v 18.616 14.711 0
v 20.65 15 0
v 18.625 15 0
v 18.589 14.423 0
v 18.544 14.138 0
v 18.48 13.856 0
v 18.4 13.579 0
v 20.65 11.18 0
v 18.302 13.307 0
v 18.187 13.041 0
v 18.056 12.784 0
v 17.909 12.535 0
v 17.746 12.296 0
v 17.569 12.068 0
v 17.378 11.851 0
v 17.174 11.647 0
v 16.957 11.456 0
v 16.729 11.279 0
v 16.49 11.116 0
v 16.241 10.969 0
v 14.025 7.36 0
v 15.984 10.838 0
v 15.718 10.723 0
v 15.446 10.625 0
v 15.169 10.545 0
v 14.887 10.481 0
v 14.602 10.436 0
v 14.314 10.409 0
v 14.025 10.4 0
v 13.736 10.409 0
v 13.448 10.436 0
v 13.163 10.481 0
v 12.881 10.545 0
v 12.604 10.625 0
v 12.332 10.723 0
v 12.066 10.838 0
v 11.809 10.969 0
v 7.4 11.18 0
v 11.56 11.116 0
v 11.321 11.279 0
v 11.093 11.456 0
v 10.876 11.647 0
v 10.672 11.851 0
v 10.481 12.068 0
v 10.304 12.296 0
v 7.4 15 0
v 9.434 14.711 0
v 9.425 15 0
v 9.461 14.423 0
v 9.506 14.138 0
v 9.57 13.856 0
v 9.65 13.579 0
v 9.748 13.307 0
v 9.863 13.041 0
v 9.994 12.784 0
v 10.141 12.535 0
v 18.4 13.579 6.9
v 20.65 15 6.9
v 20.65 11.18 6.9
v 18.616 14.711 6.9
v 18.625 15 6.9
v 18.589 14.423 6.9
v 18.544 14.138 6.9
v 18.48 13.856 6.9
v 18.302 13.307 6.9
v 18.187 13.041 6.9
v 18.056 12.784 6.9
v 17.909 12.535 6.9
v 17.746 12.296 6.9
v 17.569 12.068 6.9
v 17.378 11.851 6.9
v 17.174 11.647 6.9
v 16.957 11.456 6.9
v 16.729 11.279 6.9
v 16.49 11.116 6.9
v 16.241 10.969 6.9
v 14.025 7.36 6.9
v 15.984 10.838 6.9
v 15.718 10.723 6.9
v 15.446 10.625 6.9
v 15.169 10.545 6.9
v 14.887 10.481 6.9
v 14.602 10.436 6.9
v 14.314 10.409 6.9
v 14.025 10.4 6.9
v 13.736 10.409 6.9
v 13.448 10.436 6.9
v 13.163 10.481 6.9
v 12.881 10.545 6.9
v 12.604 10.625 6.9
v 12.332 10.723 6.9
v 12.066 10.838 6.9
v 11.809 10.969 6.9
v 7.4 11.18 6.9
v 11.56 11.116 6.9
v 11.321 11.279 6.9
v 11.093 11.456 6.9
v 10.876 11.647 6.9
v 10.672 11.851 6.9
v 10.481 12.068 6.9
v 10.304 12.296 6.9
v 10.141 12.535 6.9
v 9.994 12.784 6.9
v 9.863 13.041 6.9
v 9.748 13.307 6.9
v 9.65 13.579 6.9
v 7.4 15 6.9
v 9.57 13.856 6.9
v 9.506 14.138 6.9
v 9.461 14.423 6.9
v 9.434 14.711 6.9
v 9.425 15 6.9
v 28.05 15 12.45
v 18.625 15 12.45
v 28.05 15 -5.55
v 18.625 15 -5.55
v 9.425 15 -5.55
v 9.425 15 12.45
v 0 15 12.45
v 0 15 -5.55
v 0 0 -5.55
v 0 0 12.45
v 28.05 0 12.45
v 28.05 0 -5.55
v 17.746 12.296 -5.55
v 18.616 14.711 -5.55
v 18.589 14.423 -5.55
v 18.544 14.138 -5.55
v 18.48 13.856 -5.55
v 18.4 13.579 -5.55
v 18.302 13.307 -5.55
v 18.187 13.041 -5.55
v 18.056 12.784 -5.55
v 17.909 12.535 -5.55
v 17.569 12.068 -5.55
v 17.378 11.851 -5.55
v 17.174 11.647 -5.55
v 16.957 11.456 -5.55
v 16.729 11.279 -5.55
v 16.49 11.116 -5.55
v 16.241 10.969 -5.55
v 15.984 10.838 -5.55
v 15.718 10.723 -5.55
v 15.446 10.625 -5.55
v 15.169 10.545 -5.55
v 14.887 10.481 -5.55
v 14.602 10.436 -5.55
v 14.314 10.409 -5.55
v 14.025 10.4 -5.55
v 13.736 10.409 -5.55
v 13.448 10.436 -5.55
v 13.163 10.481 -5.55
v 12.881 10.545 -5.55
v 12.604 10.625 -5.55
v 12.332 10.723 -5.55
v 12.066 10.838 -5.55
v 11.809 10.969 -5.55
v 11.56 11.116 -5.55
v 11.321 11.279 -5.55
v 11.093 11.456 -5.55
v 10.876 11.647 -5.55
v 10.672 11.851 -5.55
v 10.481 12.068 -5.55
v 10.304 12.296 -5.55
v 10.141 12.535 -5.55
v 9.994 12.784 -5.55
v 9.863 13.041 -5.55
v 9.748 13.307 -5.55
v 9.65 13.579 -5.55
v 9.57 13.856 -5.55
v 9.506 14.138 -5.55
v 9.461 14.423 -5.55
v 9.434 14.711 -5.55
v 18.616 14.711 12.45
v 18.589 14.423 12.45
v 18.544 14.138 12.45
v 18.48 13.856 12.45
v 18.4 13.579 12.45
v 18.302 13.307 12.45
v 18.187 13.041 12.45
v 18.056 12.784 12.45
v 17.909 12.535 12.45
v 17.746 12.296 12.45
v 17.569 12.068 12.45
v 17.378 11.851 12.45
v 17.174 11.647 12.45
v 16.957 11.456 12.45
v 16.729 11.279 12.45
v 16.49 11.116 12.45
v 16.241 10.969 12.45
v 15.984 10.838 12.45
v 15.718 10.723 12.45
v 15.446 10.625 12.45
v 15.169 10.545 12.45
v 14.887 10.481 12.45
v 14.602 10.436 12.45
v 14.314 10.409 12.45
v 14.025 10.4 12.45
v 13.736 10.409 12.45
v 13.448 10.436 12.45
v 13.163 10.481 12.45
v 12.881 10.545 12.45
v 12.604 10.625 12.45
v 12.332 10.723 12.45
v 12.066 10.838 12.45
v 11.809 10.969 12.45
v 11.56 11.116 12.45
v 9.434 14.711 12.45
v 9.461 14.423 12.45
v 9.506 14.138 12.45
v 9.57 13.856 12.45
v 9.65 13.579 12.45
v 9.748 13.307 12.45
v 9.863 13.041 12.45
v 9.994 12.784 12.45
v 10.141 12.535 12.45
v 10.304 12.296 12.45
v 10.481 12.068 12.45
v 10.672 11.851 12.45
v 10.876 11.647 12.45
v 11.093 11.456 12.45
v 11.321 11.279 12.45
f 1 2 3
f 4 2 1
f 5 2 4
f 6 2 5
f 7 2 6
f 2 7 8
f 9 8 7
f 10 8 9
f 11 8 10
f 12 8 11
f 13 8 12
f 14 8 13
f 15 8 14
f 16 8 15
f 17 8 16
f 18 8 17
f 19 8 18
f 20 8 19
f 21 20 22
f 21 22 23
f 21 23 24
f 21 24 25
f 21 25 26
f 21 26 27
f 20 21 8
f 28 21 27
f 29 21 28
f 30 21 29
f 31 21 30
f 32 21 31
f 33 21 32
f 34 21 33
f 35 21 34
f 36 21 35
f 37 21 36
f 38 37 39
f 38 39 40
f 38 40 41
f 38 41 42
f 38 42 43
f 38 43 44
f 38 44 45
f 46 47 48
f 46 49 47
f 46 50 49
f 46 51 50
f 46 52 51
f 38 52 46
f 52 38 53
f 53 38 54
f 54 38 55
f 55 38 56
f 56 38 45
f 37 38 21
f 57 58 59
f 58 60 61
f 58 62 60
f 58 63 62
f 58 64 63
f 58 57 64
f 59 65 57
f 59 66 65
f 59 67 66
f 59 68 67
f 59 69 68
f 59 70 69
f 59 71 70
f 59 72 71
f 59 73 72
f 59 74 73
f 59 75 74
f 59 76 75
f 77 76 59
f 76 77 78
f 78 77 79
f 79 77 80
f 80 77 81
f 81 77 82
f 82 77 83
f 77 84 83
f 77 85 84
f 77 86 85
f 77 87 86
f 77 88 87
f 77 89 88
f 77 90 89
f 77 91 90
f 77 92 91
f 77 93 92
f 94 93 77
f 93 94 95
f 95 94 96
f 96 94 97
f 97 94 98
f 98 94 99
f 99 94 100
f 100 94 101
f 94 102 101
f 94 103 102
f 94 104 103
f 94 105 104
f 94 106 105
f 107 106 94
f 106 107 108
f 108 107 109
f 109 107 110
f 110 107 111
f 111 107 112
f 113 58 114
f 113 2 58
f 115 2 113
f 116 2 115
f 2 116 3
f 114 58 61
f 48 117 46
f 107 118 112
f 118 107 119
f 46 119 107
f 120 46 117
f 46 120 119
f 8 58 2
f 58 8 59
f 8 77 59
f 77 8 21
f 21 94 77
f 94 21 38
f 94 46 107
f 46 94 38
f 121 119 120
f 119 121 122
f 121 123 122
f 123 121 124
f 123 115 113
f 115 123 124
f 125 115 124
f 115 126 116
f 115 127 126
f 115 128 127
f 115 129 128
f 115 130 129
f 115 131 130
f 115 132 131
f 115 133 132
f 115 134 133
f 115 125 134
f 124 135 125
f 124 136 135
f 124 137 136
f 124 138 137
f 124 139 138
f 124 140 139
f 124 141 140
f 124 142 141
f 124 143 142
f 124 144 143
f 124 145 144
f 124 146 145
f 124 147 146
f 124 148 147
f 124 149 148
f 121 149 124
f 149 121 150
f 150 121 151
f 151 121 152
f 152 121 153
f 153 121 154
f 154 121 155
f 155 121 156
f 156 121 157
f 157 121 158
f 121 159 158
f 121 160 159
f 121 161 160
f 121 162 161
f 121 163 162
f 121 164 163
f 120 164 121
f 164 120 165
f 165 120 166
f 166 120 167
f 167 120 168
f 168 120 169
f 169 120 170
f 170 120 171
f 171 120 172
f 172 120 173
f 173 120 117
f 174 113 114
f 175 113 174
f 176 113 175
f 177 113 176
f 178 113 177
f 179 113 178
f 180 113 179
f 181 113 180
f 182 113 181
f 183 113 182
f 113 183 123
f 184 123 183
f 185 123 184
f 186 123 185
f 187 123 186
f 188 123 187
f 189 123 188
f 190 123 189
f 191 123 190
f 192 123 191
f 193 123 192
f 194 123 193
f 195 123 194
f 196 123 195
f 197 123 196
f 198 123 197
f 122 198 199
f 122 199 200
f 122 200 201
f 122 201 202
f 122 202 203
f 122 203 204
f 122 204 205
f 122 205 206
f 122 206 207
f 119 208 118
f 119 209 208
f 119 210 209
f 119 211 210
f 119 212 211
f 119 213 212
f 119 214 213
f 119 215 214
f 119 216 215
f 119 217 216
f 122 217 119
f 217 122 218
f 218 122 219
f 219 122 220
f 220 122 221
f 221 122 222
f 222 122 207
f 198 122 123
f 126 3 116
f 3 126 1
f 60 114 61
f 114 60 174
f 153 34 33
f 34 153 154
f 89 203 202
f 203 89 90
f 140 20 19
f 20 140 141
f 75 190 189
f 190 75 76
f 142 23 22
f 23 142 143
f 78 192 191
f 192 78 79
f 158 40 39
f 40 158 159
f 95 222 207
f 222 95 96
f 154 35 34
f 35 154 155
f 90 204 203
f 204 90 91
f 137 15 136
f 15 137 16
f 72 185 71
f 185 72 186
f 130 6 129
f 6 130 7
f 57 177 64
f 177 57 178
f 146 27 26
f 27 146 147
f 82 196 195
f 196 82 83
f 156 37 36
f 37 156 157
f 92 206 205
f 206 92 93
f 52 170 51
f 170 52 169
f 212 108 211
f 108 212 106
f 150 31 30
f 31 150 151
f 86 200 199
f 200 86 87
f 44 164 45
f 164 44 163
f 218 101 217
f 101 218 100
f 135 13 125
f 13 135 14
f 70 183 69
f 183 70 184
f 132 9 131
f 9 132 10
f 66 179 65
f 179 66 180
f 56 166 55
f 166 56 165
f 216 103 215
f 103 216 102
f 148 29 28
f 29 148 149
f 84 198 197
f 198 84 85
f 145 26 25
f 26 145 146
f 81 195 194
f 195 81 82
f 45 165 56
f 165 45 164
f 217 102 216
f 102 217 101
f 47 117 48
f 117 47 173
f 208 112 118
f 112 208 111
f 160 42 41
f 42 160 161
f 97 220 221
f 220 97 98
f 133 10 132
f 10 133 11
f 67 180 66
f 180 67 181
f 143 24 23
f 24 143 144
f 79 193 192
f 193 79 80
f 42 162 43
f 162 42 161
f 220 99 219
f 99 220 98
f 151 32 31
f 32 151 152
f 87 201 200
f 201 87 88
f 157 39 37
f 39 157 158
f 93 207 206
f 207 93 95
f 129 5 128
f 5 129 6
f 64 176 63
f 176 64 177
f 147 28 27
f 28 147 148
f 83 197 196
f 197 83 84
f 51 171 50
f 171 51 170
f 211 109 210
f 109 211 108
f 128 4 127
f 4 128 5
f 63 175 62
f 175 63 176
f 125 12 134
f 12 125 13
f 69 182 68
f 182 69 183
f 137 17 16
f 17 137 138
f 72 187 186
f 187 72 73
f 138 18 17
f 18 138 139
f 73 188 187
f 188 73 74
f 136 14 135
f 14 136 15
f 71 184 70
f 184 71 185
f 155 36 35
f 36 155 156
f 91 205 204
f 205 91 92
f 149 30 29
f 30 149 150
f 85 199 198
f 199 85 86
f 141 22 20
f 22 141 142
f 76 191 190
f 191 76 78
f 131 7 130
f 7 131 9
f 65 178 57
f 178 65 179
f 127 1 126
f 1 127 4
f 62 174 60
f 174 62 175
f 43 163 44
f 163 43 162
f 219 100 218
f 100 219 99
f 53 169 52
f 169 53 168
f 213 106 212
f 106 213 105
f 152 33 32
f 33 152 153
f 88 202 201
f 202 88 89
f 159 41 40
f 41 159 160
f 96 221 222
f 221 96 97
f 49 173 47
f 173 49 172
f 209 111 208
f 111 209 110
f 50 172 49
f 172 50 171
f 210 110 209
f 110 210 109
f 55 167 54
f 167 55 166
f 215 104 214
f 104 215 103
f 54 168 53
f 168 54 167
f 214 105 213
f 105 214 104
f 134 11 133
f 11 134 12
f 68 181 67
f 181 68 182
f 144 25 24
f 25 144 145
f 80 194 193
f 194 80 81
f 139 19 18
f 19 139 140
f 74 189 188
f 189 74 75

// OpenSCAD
LM8UU_DIA = 14;
n_diff = (LM8UU_DIA/2)-5.7;


n_height = n_diff +13.7;
n_width = 6.9; // the thickness of the nut so you could use studding connectors
nh_width = 28.05;
nh_padding = 5.55;


z_nut_holder_base();

module z_nut_holder_base()
{
	difference()
	{
	union()
		{	
		linear_extrude(height = n_width)
			polygon(points=[[0,0],[0,n_height],[7.4,n_height],[7.4,n_height-3.82],[nh_width/2,n_height-7.64],[20.65,n_height-3.82],[20.65,n_height],[nh_width,n_height],[nh_width,0]]);
		
			translate([0,0,-nh_padding])
				linear_extrude(height = nh_padding)
					polygon(points=[[0,0],[0,n_height],[nh_width,n_height],[nh_width,0]]);
			translate([0,0,n_width])
				linear_extrude(height = nh_padding)
					polygon(points=[[0,0],[0,n_height],[nh_width,n_height],[nh_width,0]]);

	}
			translate([nh_width/2,n_height,-nh_padding-1])
				linear_extrude(height = 2 + (nh_padding*2) + n_width)
					circle(r=9.2/2, $fn=100);



	}
}





echo( n_diff, n_height);
